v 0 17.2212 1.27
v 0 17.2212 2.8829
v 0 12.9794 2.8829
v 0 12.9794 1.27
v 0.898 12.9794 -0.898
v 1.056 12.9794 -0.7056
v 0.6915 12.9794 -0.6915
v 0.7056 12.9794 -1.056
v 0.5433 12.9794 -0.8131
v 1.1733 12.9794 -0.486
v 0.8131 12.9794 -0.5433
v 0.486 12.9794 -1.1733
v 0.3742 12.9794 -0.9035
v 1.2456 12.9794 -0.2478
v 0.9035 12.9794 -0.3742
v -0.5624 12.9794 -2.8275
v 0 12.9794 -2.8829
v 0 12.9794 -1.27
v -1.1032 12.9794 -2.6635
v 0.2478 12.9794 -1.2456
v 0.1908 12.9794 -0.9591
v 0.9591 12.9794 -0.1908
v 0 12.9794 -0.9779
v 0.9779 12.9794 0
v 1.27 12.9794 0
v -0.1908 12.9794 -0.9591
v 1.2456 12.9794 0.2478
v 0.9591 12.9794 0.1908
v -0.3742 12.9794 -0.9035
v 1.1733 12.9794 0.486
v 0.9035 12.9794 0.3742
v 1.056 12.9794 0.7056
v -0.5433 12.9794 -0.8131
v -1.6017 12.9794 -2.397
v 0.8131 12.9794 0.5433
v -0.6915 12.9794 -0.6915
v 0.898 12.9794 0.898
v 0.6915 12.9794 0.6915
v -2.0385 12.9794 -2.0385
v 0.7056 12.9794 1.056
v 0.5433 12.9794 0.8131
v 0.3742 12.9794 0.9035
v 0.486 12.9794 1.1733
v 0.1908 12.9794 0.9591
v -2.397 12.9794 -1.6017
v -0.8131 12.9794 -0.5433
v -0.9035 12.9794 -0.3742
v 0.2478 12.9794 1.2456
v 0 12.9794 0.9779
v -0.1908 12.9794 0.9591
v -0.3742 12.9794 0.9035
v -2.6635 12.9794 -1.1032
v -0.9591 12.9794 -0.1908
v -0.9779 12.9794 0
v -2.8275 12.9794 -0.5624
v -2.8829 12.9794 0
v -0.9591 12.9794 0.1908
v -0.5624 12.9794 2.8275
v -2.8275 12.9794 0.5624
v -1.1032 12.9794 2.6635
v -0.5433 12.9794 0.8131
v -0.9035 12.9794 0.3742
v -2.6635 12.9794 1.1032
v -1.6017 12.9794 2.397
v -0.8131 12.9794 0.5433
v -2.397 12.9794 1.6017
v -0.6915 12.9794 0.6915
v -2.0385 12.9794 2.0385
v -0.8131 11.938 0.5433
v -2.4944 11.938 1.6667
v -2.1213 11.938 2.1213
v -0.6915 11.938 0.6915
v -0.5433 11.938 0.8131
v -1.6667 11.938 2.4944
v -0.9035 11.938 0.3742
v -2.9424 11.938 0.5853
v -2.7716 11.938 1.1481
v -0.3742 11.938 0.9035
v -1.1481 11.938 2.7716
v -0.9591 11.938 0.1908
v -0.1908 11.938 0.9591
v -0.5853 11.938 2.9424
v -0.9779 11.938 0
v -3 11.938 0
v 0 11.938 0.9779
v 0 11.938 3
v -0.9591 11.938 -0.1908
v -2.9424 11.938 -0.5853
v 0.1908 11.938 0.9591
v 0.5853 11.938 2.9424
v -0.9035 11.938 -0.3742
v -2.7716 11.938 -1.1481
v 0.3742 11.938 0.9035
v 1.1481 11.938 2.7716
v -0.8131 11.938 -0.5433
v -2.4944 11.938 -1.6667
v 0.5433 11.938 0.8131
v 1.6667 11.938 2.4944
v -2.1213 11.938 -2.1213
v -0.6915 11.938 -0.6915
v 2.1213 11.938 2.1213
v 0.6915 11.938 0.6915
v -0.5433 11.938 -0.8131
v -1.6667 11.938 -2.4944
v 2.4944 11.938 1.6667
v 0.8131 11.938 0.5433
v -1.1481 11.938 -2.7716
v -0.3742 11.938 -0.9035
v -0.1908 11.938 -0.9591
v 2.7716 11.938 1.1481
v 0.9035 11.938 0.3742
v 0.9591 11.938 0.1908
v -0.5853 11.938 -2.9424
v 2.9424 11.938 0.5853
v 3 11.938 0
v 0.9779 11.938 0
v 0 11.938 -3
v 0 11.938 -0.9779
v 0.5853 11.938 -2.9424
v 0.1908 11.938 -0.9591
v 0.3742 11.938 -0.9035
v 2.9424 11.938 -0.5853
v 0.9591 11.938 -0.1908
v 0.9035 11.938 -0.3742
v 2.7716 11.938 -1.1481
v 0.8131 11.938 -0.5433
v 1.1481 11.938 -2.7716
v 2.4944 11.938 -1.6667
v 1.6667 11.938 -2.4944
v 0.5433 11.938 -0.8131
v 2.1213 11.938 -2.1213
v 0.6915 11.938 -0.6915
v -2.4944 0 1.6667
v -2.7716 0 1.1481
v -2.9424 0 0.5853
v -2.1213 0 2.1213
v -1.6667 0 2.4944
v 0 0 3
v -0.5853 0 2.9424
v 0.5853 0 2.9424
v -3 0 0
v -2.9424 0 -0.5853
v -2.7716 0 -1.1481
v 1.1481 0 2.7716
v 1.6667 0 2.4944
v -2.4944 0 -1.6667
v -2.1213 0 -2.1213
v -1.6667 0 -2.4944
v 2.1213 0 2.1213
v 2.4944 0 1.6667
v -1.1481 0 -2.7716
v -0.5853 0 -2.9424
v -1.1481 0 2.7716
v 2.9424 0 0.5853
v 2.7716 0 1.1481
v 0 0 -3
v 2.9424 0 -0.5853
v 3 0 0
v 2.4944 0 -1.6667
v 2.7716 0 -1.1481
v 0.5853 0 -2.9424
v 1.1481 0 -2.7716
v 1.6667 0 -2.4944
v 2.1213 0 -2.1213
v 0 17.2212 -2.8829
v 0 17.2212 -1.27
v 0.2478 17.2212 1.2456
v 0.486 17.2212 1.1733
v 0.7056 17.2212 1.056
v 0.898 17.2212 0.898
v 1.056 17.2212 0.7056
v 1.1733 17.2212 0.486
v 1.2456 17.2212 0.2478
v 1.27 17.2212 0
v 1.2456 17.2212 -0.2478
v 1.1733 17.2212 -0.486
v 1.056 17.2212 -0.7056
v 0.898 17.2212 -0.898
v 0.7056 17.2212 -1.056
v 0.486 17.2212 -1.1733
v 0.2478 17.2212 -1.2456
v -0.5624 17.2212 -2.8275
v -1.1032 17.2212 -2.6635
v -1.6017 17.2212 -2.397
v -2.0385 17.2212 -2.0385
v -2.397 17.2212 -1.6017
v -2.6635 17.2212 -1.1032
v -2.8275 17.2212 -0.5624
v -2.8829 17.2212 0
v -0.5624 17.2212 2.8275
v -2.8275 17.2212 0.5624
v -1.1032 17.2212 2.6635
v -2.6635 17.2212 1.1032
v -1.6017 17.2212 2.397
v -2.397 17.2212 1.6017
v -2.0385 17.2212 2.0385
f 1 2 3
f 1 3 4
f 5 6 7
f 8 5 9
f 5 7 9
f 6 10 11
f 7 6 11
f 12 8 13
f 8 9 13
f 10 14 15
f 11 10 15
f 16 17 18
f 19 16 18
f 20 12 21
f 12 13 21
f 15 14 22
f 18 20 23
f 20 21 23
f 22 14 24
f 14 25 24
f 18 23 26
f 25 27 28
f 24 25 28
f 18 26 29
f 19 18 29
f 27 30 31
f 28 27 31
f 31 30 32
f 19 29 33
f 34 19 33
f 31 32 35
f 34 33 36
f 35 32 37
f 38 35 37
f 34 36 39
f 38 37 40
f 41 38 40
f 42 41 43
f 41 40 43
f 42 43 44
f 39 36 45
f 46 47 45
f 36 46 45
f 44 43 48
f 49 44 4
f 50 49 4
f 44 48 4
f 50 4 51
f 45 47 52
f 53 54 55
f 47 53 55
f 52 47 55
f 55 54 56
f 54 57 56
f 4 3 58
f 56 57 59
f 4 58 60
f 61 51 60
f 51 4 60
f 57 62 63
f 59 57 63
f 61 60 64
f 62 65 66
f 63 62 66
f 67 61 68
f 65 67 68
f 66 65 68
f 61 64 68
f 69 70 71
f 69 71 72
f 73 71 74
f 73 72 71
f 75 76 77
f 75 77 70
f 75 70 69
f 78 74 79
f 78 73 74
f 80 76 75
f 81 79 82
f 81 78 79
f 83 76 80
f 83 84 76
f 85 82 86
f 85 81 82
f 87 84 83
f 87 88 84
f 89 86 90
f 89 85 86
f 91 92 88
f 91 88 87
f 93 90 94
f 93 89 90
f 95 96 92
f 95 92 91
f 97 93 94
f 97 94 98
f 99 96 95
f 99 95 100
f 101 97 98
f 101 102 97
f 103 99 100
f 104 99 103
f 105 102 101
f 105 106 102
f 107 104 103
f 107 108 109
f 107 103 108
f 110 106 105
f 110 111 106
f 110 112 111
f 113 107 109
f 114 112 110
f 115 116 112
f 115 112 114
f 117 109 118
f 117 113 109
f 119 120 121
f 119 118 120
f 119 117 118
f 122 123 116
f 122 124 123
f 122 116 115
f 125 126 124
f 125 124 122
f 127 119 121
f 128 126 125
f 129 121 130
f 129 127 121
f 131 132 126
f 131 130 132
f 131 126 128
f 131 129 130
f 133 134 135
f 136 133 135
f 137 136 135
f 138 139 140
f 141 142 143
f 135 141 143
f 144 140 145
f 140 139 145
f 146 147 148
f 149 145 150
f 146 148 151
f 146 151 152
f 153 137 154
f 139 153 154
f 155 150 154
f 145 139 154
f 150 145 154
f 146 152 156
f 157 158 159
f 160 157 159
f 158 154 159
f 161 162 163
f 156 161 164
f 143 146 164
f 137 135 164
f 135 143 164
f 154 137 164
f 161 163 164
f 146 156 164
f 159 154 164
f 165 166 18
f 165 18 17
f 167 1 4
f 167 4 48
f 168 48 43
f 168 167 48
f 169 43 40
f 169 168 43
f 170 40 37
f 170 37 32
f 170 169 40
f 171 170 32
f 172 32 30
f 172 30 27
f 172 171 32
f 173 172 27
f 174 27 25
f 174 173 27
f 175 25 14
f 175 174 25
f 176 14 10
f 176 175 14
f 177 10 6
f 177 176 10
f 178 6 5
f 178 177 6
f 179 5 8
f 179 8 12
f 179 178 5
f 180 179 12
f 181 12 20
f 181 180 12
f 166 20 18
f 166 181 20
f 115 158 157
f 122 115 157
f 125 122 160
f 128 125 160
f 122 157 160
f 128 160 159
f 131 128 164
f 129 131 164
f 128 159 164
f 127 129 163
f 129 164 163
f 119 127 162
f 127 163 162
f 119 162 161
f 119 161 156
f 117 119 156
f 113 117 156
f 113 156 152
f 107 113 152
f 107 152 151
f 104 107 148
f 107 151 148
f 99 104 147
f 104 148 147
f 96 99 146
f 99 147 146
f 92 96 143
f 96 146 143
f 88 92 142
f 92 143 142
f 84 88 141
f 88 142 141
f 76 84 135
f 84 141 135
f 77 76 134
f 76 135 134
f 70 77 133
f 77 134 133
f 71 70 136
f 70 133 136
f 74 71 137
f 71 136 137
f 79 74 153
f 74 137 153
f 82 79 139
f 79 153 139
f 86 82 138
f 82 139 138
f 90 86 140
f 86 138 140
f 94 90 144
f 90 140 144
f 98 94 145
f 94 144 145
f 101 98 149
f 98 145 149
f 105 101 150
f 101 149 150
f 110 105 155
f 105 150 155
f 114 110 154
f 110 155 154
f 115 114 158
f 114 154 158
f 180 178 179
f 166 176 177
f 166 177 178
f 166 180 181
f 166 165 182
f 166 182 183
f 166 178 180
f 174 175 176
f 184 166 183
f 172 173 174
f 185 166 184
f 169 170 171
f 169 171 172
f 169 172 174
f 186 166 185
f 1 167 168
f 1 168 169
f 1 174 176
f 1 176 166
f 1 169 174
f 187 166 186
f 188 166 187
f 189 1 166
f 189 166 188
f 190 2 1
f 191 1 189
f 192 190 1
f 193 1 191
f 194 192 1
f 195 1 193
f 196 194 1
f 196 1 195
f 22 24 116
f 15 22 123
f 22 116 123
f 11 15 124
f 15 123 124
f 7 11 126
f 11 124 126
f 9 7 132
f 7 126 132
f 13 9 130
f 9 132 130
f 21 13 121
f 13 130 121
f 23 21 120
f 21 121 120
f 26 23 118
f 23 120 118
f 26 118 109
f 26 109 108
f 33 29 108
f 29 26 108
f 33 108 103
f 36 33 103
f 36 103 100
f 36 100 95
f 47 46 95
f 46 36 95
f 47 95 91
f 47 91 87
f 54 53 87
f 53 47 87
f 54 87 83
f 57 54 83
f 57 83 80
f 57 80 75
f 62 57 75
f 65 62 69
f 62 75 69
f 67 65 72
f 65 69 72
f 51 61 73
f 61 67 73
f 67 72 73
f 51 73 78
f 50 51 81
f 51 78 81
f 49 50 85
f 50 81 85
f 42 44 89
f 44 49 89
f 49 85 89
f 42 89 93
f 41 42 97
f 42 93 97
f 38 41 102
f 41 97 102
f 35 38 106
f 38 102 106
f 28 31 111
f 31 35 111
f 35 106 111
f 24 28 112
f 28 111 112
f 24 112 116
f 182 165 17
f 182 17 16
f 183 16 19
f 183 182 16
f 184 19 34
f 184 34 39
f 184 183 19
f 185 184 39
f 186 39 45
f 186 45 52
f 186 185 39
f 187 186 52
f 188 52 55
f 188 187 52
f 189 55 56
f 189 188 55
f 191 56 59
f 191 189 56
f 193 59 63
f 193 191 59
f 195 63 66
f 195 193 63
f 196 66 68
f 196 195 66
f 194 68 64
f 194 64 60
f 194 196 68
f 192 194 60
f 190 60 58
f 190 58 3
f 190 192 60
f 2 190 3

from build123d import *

# Parameters (mm, degrees)
SKETCH1_R           = 3
BOSS_EXTRUDE1_DEPTH = 11.938
SKETCH2_R           = 0.9779
BOSS_EXTRUDE2_DEPTH = 5.2832
BOSS_EXTRUDE3_DEPTH = 4.2418


with BuildPart() as part:
    # Sketch1 → Boss-Extrude1 (new body)
    with BuildSketch(Plane(origin=(0, 0, 0), x_dir=(1, 0, 0), z_dir=(0, 1, 0))):
        Circle(SKETCH1_R)
    extrude(amount=BOSS_EXTRUDE1_DEPTH)

    # Sketch2 → Boss-Extrude2 (add)
    with BuildSketch(Plane(origin=(0, 11.938, 0), x_dir=(1, 0, 0), z_dir=(0, 1, 0))):
        Circle(SKETCH2_R)
    extrude(amount=BOSS_EXTRUDE2_DEPTH)

    # Sketch4 → Boss-Extrude3 (add)
    with BuildSketch(Plane(origin=(0, 17.2212, -17.2212), x_dir=(1, 0, 0), z_dir=(0, -1, 0))):
        with BuildLine():
            Line((0, 20.1041), (0, 18.4912))
            ThreePointArc((0, 18.4912), (1.27, 17.2212), (0, 15.9512))
            Line((0, 15.9512), (0, 14.3383))
            ThreePointArc((0, 14.3383), (-2.8829, 17.2212), (0, 20.1041))
        make_face()
    extrude(amount=BOSS_EXTRUDE3_DEPTH)


solid = part.part
